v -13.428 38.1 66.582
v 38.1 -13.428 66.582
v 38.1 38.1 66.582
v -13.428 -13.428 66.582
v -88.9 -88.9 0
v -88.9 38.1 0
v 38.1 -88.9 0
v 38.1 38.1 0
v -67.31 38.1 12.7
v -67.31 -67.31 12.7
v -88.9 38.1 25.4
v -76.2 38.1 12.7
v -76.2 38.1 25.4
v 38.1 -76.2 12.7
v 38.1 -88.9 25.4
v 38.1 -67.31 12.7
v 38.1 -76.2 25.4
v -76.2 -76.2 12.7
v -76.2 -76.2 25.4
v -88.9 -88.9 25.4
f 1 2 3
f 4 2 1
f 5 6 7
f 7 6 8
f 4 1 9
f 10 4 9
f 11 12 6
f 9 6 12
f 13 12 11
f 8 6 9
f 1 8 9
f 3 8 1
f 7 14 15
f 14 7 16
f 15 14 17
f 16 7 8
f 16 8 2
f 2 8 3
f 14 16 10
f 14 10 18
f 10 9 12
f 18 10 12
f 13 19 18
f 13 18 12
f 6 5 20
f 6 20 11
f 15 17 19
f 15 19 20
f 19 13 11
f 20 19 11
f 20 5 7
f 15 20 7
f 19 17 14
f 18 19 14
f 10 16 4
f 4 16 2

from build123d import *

# Parameters (mm, degrees)
F0_W      = 177.8
F0_H      = 177.8
F1_DEPTH  = 76.2
F3_DEPTH  = 156.21
F5_DEPTH  = 156.21
F6_DEPTH  = 76.9294632736
F8_DEPTH  = 21.591
F9_DEPTH  = 8.89
F2_W      = 50.8
F2_H      = 76.2
F10_DEPTH = 177.801
F4_W      = 50.8
F4_H      = 76.2
F11_DEPTH = 177.801


with BuildPart() as f1:
    # F0 (on Top) → F1 (new body)
    with BuildSketch(Plane.XY):
        Rectangle(F0_W, F0_H)
    extrude(amount=F1_DEPTH)

    # F2 (on face) → F3 (cut)
    with BuildSketch(Plane(origin=(0, 88.9, 0), x_dir=(-1, 0, 0), z_dir=(0, 1, 0))):
        Polygon((76.2, 25.4), (88.9, 25.4), (88.9, 76.2), (-11.9715367264, 76.2), (-11.9715367264, 66.5815367264), (13.4284632736, 66.5815367264), (67.31, 12.7), (76.2, 12.7), align=None)
    extrude(amount=-F3_DEPTH, mode=Mode.SUBTRACT)

    # F4 (on face) → F5 (cut)
    with BuildSketch(Plane.YZ.offset(88.9)):
        Polygon((-13.4284632736, 66.5815367264), (11.9715367264, 66.5815367264), (11.9715367264, 76.2), (-88.9, 76.2), (-88.9, 25.4), (-76.2, 25.4), (-76.2, 12.7), (-67.31, 12.7), align=None)
    extrude(amount=-F5_DEPTH, mode=Mode.SUBTRACT)

    # F6 (cut, through all): a face of the model
    f6_faces = [f1.faces().sort_by_distance(p)[0] for p in [
        (50.4357683632, 11.9715367264, 71.3907683632),
    ]]
    extrude(f6_faces, amount=-F6_DEPTH, mode=Mode.SUBTRACT)

    # F7 (on face) → F8 (cut, through all)
    with BuildSketch(Plane.YZ.offset(-67.31)):
        Polygon((-88.9, 76.2), (-88.9, 25.4), (-76.2, 25.4), (-67.31, 25.4), (-67.31, 76.2), align=None)
    extrude(amount=-F8_DEPTH, mode=Mode.SUBTRACT)

    # F9 (cut): a face of the model
    f9_faces = [f1.faces().sort_by_distance(p)[0] for p in [
        (-67.31, -71.755, 19.05),
    ]]
    extrude(f9_faces, amount=-F9_DEPTH, mode=Mode.SUBTRACT)

    # F2 (on face) → F10 (cut, through all)
    with BuildSketch(Plane(origin=(0, 88.9, 0), x_dir=(-1, 0, 0), z_dir=(0, 1, 0))):
        with Locations((-63.5, 38.1)):
            Rectangle(F2_W, F2_H)
    extrude(amount=-F10_DEPTH, mode=Mode.SUBTRACT)

    # F4 (on face) → F11 (cut, through all)
    with BuildSketch(Plane.YZ.offset(88.9)):
        with Locations((63.5, 38.1)):
            Rectangle(F4_W, F4_H)
    extrude(amount=-F11_DEPTH, mode=Mode.SUBTRACT)


solid = f1.part
